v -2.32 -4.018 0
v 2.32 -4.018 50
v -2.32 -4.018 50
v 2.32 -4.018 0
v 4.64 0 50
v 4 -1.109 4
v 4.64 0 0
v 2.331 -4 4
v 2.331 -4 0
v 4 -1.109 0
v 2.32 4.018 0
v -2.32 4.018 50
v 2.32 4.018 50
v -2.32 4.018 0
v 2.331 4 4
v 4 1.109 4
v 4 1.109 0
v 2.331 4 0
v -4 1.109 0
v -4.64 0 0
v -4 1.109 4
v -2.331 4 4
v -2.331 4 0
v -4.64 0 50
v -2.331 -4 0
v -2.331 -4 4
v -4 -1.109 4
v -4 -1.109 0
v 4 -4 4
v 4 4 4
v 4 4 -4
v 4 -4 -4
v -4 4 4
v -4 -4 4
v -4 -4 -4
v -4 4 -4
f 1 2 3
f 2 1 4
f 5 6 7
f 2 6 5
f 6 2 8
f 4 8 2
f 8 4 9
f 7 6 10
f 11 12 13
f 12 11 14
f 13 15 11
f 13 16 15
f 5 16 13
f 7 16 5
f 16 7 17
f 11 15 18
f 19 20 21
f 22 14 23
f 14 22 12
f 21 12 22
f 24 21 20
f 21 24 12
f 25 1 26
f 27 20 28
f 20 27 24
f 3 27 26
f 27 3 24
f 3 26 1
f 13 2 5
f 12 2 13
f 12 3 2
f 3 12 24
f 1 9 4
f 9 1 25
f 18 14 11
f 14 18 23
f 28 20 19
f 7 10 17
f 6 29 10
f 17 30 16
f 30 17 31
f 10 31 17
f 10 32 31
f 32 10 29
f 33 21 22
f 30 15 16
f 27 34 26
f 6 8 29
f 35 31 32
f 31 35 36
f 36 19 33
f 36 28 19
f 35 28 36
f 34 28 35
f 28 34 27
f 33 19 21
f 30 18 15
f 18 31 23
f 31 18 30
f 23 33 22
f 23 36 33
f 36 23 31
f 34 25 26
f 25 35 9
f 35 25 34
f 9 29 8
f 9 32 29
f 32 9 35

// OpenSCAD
cylinder(h=50, r=8* 0.58, $fn=6);
cube([8,8,8],center=true);
